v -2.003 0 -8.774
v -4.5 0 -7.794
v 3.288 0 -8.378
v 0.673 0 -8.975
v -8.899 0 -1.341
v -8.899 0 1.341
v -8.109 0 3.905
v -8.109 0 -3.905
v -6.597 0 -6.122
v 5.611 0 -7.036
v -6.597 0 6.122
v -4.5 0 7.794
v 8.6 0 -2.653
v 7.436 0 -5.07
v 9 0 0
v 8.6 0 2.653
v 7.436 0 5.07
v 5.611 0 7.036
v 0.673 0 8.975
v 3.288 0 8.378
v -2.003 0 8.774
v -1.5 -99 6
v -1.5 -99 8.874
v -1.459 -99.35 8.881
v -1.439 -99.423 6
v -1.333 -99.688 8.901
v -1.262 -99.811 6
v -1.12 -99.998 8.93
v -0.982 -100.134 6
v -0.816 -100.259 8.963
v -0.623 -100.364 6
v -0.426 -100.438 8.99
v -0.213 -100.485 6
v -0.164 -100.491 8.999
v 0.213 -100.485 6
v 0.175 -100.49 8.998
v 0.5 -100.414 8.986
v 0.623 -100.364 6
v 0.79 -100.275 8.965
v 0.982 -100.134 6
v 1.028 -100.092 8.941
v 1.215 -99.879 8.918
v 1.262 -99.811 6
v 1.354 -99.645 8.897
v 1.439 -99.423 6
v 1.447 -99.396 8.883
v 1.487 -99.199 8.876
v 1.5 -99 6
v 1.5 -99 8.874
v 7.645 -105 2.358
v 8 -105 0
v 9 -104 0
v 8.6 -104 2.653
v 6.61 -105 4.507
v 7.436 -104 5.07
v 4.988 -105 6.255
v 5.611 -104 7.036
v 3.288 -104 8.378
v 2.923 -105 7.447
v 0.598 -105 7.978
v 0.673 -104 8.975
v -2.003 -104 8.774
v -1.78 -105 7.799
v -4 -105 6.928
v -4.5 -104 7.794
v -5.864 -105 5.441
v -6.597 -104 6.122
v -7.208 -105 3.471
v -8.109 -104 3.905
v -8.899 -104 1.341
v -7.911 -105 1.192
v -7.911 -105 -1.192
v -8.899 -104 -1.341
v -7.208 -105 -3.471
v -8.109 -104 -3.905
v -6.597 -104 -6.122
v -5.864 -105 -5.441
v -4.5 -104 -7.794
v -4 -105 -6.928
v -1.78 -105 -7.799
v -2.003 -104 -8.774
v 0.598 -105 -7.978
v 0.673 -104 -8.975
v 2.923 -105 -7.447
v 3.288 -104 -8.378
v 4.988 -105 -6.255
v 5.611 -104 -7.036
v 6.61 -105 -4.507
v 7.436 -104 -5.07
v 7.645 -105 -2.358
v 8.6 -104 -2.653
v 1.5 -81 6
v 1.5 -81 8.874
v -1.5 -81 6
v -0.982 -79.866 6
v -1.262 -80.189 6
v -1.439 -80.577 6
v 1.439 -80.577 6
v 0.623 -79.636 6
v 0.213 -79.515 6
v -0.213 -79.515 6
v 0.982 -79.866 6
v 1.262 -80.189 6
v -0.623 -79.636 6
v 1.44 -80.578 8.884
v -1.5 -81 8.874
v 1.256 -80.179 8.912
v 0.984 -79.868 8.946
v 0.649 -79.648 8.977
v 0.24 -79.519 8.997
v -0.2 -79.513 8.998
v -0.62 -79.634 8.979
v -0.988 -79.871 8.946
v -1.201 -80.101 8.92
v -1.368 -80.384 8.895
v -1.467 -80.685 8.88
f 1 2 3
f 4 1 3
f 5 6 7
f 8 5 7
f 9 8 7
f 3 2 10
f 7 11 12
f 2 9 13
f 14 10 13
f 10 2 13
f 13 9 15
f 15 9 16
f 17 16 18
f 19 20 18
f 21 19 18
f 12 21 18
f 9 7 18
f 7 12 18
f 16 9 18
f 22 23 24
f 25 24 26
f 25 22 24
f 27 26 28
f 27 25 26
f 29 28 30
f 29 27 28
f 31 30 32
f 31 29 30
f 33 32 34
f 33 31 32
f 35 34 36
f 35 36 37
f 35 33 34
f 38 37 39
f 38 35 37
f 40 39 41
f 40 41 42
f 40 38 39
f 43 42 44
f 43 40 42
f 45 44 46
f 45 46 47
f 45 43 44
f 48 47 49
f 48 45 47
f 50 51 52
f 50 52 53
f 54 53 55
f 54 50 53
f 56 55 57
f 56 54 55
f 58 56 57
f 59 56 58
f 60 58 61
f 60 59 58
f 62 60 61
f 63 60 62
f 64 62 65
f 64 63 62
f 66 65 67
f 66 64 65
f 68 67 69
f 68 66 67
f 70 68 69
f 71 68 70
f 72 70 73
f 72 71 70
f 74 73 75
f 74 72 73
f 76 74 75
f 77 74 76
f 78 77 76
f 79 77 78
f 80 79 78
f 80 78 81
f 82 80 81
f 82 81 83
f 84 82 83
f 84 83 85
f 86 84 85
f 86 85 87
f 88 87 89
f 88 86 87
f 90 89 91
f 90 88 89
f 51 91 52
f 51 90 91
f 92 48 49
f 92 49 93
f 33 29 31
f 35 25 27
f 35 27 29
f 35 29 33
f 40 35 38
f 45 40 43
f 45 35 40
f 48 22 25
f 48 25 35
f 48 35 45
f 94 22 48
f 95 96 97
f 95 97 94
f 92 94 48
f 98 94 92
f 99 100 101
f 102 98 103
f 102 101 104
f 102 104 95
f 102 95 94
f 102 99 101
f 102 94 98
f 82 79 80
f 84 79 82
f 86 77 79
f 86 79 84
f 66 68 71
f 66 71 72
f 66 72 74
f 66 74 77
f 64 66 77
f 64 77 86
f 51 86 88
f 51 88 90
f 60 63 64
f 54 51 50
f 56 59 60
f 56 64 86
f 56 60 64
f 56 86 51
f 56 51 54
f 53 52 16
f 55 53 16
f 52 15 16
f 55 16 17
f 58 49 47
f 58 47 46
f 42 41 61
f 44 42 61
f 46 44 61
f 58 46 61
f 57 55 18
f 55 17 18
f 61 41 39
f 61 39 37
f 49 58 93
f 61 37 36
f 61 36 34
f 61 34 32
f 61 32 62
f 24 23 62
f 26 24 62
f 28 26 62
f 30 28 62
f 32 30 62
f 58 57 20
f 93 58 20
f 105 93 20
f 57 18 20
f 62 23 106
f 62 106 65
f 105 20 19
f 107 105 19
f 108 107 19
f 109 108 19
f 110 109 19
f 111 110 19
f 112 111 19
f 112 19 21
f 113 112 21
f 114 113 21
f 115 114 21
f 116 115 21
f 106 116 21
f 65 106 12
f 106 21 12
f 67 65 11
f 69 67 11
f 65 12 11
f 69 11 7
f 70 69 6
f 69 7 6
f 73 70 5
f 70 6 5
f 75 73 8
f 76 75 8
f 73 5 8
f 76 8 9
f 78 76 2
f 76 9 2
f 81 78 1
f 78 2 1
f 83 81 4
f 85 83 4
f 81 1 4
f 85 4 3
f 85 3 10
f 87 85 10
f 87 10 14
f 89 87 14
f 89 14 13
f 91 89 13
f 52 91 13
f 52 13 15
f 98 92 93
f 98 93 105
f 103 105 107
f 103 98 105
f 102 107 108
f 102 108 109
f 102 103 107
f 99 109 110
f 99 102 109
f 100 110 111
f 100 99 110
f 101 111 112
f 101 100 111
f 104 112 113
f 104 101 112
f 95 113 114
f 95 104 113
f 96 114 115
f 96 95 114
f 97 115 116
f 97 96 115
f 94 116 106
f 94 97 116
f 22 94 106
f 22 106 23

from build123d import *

# Parameters (mm, degrees)
F0_R     = 9
F1_DEPTH = 105
F2_SIZE  = 1
F5_DEPTH = 25


with BuildPart() as f1:
    # F0 (on Front) → F1 (new body)
    with BuildSketch(Plane.XZ):
        Circle(F0_R)
    extrude(amount=F1_DEPTH)

    # F2
    f2_edges = [f1.edges().sort_by_distance(p)[0] for p in [
        (-9, -105, 0),
    ]]
    chamfer(f2_edges, length=F2_SIZE)

    # F4 (on offset) → F5 (cut)
    with BuildSketch(Plane.XY.offset(6)):
        with BuildLine():
            ThreePointArc((1.5, -81), (0, -79.5), (-1.5, -81))
            Line((-1.5, -81), (-1.5, -99))
            ThreePointArc((-1.5, -99), (0, -100.5), (1.5, -99))
            Line((1.5, -99), (1.5, -81))
        make_face()
    extrude(amount=F5_DEPTH, mode=Mode.SUBTRACT)


solid = f1.part
